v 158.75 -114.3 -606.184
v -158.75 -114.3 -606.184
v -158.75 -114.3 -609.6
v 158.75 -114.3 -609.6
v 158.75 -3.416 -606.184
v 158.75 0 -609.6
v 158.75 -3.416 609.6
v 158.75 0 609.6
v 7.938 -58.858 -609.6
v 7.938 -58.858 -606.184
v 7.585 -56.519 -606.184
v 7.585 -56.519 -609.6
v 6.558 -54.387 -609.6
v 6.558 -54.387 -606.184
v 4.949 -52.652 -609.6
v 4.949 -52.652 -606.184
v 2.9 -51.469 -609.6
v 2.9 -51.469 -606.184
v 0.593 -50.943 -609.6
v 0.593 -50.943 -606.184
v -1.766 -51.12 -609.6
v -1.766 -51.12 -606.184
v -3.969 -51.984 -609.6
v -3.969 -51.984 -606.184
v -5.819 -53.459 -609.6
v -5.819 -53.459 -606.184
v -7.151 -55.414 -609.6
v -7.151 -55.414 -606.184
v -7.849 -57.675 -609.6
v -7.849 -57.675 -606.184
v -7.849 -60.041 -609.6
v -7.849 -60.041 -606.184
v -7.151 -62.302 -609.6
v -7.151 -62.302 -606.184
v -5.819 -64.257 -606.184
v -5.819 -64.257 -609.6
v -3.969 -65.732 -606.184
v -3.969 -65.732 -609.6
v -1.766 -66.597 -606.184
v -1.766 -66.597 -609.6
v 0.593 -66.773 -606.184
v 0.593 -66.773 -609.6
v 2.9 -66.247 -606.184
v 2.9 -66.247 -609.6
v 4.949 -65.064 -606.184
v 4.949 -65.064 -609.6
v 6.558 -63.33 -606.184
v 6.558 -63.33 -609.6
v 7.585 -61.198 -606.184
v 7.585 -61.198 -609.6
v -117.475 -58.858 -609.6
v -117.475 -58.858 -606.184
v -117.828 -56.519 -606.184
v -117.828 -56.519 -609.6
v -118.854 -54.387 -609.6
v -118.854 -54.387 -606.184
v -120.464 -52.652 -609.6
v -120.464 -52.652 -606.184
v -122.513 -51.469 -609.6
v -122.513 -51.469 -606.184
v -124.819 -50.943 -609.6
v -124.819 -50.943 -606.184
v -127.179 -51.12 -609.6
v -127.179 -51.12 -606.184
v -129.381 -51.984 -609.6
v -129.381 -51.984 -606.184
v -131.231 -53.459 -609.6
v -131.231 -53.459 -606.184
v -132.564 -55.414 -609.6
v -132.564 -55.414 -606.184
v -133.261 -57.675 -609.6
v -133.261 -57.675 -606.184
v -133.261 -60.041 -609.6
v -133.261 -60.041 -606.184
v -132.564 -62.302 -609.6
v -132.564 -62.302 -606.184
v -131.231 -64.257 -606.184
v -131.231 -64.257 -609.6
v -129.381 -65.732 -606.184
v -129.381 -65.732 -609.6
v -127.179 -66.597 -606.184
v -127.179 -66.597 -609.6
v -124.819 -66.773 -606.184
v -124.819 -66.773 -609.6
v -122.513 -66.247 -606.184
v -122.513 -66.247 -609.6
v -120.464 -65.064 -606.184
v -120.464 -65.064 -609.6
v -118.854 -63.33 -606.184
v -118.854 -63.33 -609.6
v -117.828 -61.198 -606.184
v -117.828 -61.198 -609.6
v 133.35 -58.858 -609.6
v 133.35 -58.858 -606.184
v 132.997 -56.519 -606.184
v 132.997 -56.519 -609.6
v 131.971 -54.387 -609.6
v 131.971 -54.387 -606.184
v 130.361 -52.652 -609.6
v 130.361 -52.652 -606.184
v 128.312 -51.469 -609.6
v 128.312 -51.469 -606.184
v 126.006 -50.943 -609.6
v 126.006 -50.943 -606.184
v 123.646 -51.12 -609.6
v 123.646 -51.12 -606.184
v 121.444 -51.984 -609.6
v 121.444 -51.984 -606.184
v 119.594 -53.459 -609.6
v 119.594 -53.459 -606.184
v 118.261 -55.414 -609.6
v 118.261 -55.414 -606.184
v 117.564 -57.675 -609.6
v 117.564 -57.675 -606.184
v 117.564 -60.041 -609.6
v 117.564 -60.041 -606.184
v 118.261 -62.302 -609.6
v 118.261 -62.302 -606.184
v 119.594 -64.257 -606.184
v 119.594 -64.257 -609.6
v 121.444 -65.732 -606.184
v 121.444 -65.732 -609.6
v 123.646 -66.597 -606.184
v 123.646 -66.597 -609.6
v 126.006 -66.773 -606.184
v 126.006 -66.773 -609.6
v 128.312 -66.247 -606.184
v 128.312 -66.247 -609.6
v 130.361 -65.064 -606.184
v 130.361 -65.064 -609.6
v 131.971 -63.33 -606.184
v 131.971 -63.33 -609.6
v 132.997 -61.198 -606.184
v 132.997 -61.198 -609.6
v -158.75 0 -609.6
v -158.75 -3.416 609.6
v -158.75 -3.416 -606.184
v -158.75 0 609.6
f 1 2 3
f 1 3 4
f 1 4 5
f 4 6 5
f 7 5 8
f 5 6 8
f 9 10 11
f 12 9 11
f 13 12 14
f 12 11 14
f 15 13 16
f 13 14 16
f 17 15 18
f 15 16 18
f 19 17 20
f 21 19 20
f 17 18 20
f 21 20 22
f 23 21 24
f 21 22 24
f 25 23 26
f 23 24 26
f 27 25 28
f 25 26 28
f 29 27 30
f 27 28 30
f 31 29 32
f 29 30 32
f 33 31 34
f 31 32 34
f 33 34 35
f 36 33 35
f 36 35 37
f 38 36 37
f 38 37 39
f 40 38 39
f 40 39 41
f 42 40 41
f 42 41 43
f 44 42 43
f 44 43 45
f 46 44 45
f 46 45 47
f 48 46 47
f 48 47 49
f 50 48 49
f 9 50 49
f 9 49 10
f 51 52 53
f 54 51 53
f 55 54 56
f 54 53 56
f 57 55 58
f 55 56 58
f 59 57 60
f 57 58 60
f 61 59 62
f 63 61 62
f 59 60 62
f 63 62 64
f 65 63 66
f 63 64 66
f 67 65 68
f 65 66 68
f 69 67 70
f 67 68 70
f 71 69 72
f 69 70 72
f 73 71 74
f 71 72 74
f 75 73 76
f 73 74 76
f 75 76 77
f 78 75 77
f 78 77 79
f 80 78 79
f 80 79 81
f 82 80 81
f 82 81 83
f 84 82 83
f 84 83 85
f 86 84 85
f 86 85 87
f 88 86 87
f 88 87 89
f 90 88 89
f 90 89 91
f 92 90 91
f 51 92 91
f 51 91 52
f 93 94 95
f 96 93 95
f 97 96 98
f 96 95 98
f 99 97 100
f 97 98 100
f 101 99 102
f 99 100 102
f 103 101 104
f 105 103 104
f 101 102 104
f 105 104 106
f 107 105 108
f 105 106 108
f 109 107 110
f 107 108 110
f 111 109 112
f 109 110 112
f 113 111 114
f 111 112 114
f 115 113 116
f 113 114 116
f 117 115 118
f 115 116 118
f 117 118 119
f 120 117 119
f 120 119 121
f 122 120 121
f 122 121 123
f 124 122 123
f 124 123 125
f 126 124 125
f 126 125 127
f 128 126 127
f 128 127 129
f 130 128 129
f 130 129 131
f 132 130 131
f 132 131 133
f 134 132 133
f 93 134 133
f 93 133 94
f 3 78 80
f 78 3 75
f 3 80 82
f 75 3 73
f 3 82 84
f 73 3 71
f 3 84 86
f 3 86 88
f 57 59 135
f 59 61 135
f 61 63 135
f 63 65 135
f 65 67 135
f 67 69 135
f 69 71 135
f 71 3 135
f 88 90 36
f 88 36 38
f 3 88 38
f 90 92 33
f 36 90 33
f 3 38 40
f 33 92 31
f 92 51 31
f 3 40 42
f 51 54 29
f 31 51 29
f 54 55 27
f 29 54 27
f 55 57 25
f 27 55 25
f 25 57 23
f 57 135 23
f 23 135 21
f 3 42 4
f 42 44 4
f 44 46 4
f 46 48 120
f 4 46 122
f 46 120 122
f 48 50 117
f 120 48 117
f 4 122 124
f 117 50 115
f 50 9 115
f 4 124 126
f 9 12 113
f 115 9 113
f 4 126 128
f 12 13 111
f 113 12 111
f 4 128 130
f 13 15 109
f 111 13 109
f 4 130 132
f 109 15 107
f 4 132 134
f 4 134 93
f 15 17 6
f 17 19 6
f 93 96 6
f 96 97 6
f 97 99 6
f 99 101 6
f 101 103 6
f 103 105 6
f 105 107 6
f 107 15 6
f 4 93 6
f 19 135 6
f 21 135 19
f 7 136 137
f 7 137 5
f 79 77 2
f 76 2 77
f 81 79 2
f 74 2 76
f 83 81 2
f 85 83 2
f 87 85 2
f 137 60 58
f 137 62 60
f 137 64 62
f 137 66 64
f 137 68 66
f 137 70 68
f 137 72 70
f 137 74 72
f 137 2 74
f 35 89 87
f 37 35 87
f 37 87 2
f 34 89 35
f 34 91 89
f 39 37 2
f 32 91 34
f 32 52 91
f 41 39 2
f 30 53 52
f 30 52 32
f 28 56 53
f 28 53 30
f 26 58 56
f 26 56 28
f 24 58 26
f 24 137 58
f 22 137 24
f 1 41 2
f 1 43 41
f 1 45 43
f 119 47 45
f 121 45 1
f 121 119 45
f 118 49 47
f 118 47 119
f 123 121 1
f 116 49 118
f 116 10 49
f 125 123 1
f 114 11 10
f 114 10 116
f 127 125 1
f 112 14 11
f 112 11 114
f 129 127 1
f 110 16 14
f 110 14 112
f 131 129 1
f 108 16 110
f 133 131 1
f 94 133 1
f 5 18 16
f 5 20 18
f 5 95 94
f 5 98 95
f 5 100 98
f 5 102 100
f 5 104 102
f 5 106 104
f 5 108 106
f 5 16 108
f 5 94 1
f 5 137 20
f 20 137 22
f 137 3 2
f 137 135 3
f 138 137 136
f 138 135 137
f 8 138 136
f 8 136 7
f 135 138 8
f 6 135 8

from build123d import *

# Parameters (mm, degrees)
F0_W     = 317.5
F0_H     = 1219.2
F1_DEPTH = 3.4163
F2_W     = 317.5
F2_H     = 3.4163
F3_DEPTH = 110.8837
F4_R     = 7.9375
F5_DEPTH = 3.4173


with BuildPart() as f1:
    # F0 (on Front) → F1 (new body)
    with BuildSketch(Plane.XZ):
        Rectangle(F0_W, F0_H)
    extrude(amount=F1_DEPTH)

    # F2 (on face) → F3 (join)
    with BuildSketch(Plane.XZ.offset(3.4163)):
        with Locations((0, -607.89185)):
            Rectangle(F2_W, F2_H)
    extrude(amount=F3_DEPTH)

    # F4 (on face) → F5 (cut, through all)
    with BuildSketch(Plane.XY.offset(-606.1837)):
        with Locations((-125.4125, -58.85815)):
            Circle(F4_R)
        with Locations((0, -58.85815)):
            Circle(F4_R)
        with Locations((125.4125, -58.85815)):
            Circle(F4_R)
    extrude(amount=-F5_DEPTH, mode=Mode.SUBTRACT)


solid = f1.part
